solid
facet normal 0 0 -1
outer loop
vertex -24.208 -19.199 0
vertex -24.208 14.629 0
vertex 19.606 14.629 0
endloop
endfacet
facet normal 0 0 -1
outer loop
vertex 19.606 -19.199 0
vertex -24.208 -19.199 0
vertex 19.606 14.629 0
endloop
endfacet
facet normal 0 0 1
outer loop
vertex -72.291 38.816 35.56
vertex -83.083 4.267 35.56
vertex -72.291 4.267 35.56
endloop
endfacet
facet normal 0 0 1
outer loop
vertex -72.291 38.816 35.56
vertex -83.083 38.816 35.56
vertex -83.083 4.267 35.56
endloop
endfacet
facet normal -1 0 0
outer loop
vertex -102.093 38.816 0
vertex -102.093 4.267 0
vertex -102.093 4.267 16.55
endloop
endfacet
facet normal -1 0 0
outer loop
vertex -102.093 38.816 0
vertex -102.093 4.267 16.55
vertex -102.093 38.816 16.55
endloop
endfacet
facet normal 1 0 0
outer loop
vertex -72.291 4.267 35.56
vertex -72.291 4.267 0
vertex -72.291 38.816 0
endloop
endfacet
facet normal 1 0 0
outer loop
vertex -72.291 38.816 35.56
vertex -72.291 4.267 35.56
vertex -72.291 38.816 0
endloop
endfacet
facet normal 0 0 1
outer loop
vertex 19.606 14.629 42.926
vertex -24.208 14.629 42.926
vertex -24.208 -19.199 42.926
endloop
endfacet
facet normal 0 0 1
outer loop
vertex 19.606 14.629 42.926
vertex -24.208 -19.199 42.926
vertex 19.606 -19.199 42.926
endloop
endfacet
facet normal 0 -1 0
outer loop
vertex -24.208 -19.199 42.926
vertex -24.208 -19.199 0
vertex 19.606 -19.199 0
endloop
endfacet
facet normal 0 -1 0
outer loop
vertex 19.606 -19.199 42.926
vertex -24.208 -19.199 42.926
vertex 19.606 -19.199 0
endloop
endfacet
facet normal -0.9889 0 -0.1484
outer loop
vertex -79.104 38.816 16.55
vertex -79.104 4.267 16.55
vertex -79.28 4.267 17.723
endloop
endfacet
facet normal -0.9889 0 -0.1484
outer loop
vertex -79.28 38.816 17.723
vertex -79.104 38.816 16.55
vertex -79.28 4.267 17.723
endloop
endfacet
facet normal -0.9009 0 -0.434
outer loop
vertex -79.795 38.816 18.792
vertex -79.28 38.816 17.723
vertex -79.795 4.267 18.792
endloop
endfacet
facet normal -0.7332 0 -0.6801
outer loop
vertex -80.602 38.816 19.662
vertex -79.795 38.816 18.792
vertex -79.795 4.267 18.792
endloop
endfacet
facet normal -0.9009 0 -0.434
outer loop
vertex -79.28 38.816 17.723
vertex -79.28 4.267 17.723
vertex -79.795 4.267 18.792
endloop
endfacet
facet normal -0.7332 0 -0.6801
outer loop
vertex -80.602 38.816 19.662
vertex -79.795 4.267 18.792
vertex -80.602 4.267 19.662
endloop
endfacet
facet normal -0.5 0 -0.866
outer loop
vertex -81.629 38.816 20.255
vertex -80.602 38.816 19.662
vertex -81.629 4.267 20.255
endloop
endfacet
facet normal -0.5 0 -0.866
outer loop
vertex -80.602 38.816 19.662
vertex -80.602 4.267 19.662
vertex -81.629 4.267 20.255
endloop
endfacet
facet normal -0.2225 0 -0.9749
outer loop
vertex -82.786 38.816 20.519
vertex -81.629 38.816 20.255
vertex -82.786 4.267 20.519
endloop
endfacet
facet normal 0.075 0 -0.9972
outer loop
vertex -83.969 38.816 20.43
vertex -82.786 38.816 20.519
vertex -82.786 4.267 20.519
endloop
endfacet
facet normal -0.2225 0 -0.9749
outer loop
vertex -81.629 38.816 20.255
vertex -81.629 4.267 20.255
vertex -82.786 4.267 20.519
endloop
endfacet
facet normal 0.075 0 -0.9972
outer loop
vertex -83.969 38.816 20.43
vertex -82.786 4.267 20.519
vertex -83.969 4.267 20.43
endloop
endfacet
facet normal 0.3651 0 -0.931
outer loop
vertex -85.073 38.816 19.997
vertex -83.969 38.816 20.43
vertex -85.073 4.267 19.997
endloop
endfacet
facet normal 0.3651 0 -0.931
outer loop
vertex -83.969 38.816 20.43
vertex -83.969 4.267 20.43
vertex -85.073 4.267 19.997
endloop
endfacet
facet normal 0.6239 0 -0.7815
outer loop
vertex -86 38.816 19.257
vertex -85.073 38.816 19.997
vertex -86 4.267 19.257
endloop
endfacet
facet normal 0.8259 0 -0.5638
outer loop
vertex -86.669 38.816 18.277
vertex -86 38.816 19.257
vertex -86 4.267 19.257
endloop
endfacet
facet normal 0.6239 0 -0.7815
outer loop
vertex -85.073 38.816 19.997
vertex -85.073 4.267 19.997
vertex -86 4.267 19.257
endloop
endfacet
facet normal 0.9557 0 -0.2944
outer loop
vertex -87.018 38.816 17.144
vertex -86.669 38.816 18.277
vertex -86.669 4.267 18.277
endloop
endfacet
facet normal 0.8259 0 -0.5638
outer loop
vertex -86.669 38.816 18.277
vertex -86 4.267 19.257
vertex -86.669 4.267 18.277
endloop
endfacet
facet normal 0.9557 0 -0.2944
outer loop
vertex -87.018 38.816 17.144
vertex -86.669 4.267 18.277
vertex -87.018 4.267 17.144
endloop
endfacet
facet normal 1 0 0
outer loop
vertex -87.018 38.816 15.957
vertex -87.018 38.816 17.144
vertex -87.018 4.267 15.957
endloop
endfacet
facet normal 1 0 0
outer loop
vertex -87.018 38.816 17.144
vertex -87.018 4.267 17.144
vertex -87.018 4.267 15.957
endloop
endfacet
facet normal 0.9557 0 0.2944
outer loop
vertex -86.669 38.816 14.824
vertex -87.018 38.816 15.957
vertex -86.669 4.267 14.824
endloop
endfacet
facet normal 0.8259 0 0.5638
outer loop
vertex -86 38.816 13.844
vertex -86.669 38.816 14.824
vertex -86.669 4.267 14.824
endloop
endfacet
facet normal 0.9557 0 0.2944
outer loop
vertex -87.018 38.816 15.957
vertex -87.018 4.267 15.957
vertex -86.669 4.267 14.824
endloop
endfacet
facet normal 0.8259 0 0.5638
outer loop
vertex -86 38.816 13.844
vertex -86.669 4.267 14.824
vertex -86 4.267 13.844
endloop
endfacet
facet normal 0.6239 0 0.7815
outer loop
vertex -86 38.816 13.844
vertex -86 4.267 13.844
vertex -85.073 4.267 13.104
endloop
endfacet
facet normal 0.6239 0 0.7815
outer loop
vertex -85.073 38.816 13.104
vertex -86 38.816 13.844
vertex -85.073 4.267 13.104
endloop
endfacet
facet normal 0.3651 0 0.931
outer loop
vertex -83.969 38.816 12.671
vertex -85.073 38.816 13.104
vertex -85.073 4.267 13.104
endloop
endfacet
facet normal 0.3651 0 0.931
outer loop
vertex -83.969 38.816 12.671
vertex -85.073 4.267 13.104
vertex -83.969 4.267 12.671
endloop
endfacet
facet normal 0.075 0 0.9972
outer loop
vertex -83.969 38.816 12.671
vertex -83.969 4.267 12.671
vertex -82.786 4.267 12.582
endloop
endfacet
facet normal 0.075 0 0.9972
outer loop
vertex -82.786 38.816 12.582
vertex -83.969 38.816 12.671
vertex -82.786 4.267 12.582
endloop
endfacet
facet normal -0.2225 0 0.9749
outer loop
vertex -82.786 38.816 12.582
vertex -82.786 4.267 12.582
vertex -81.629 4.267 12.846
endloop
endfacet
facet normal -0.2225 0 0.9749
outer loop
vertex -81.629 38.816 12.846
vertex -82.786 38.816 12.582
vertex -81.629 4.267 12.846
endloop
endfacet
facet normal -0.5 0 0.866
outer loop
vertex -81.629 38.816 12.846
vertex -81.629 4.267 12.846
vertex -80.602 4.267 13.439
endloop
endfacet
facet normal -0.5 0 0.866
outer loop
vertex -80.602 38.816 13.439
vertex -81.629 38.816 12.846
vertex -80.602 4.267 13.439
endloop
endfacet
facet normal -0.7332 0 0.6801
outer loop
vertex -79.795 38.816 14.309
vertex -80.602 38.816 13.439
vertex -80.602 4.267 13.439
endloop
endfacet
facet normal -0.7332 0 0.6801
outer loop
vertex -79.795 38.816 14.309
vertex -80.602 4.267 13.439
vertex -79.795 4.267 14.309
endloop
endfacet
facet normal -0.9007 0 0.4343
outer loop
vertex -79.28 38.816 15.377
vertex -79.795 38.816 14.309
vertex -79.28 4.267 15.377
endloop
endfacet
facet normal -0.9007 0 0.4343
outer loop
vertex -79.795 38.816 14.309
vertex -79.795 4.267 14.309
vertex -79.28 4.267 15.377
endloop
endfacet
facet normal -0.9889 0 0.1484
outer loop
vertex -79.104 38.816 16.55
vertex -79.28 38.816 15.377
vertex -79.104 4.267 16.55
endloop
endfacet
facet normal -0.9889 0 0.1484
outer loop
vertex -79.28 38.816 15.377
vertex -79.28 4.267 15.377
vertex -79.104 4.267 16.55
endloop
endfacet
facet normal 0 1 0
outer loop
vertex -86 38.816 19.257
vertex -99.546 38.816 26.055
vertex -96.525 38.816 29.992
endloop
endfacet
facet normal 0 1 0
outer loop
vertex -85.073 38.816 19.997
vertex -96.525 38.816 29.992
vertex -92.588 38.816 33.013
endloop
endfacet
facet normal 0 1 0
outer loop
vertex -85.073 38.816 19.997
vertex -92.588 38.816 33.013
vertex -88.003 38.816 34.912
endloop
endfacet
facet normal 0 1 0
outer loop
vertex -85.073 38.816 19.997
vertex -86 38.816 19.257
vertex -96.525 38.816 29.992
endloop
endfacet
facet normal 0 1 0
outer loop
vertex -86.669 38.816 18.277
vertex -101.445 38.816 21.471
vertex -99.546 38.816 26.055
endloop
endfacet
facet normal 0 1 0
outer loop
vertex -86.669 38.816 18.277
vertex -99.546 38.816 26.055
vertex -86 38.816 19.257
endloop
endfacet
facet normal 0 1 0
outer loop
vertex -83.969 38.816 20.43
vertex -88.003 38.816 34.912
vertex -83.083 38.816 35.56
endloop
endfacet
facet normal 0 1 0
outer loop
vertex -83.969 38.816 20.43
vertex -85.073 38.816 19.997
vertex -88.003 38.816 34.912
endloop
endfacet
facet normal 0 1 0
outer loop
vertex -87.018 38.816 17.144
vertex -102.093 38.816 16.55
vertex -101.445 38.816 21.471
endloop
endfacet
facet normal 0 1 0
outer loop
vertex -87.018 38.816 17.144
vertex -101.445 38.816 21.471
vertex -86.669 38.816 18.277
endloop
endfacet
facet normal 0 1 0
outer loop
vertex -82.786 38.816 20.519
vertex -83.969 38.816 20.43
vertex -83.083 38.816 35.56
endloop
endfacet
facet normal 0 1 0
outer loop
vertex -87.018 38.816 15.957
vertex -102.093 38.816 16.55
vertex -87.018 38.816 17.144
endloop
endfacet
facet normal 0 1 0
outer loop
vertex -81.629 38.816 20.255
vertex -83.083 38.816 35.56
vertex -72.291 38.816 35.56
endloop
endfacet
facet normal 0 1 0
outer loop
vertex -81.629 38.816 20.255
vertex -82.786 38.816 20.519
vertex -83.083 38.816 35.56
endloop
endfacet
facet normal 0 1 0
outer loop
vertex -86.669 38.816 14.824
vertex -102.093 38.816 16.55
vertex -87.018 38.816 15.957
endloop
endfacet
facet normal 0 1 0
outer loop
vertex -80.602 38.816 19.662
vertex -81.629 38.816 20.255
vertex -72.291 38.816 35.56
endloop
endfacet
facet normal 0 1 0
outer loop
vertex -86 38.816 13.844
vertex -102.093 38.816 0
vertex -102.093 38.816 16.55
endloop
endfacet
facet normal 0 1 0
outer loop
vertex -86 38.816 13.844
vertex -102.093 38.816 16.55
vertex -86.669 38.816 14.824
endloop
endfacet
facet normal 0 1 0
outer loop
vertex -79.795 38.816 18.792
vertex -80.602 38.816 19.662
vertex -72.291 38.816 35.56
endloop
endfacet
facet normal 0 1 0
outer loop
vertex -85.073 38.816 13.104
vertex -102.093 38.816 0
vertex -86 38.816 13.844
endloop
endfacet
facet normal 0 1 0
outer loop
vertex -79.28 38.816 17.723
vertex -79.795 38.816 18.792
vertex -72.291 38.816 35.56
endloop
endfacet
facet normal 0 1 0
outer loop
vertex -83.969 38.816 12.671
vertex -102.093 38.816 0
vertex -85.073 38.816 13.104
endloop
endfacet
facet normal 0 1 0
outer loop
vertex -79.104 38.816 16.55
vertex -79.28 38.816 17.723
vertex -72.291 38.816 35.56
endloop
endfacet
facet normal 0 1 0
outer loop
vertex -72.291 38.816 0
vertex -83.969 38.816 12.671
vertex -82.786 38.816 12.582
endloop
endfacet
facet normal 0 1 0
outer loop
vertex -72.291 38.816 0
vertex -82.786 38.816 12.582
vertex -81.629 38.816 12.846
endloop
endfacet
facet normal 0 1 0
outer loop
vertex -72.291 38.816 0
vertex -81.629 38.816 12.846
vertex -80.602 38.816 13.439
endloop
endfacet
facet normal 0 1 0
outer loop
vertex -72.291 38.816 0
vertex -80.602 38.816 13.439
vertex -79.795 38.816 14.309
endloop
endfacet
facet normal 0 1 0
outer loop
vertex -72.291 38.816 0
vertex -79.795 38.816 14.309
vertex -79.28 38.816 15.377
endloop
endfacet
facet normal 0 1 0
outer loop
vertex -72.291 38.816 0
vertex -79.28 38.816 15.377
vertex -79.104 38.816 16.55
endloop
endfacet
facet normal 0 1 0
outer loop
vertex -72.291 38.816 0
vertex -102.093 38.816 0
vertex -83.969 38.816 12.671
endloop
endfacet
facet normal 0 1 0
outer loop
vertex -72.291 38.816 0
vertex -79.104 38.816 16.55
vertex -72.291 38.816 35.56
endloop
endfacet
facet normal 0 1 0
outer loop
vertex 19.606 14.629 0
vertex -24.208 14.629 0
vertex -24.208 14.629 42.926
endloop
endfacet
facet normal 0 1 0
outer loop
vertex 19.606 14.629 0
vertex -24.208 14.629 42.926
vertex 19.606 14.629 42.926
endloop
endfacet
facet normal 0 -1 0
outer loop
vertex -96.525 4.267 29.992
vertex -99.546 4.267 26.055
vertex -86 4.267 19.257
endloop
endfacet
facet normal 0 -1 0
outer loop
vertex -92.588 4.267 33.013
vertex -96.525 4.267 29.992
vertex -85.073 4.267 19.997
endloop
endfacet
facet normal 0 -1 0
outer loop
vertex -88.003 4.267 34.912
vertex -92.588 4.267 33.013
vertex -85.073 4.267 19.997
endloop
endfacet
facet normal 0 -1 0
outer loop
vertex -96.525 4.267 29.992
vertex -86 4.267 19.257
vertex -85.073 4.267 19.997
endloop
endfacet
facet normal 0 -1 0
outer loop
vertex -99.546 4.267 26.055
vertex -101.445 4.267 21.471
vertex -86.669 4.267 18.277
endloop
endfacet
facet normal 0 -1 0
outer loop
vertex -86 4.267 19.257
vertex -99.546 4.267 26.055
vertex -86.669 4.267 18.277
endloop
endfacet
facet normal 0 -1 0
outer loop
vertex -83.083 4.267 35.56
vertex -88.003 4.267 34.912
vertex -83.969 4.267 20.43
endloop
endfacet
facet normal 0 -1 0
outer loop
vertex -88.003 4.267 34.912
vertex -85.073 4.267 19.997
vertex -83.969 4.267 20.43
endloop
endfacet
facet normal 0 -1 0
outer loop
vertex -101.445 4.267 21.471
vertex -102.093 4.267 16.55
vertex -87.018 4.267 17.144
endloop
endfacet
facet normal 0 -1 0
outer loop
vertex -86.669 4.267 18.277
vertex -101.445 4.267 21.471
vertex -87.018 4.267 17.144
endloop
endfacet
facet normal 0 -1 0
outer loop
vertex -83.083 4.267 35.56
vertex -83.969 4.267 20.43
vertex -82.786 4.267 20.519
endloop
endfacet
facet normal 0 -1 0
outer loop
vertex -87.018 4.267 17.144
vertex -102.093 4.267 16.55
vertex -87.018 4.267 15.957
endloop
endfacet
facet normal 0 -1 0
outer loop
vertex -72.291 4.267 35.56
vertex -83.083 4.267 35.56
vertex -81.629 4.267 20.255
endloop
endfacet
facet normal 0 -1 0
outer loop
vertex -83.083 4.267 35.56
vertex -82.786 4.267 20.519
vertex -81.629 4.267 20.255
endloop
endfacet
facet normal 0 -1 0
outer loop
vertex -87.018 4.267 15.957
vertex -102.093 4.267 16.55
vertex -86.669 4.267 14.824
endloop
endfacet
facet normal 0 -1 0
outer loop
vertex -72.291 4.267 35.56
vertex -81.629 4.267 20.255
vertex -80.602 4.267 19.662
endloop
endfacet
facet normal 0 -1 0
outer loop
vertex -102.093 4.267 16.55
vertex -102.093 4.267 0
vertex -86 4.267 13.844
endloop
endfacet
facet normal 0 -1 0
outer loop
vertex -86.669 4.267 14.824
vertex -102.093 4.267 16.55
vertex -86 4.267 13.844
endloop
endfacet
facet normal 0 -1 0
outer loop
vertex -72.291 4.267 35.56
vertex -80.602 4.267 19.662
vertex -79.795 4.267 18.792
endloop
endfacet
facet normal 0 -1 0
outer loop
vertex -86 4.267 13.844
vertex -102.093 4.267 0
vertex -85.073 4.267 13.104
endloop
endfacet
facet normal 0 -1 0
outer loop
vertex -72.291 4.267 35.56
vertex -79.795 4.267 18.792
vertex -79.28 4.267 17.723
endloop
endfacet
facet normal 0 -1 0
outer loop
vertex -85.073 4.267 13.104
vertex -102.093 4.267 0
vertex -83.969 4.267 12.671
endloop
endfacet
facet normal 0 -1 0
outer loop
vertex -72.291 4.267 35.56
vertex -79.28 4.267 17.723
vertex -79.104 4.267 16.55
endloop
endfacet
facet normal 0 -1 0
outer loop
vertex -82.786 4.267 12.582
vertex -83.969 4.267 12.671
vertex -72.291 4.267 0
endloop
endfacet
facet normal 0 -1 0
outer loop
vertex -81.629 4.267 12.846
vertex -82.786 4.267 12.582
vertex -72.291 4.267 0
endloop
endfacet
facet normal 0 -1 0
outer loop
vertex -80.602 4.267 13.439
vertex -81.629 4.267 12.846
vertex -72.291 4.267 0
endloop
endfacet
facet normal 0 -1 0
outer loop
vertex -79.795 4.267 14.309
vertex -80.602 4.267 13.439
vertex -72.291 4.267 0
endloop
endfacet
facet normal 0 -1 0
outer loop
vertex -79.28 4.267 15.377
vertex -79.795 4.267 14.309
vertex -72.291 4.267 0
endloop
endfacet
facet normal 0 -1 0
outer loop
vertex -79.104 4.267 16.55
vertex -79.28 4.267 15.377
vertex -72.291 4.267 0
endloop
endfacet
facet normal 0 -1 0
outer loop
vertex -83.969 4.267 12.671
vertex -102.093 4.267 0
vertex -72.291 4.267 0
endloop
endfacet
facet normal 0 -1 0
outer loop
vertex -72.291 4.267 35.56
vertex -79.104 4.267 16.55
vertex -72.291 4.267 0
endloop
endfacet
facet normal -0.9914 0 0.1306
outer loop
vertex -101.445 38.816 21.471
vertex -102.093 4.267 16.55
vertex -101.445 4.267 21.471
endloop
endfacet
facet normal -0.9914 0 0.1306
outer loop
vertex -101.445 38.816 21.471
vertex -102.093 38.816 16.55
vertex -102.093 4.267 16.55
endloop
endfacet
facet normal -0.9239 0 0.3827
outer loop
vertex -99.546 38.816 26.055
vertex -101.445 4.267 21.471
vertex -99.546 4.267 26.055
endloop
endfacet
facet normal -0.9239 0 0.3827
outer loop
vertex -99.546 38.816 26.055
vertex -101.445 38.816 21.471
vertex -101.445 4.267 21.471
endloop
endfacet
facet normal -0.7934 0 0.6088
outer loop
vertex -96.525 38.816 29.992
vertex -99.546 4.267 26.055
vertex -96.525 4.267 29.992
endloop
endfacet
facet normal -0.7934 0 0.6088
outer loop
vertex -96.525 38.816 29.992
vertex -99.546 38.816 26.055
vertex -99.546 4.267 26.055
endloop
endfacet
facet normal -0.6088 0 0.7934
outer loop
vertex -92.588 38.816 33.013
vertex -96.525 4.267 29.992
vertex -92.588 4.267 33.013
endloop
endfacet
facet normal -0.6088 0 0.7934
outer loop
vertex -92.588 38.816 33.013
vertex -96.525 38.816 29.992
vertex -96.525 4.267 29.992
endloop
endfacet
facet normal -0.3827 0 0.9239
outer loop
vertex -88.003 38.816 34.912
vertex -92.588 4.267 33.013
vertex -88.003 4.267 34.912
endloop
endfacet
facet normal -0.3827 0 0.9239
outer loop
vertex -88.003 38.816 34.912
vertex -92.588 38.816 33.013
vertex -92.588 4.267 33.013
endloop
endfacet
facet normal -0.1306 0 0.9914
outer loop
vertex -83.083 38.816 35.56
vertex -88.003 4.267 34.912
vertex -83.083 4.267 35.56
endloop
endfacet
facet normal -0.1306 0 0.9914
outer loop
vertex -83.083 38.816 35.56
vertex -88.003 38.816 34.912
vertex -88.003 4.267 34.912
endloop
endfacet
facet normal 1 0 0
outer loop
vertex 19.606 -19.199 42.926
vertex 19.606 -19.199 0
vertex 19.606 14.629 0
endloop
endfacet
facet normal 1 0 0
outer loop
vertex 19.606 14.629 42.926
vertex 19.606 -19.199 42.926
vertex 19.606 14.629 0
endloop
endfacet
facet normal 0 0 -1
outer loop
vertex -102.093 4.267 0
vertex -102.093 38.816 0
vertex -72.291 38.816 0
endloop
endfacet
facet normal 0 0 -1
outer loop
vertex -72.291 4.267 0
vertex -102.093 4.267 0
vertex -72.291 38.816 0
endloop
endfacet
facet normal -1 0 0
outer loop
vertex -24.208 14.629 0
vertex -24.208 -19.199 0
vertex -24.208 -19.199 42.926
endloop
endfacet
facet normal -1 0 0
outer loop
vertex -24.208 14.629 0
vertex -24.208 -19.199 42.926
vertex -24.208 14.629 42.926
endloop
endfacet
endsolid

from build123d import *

# Parameters (mm, degrees)
F0_W     = 29.801302
F0_H     = 34.548624
F1_DEPTH = 35.56
F2_R     = 19.009518
F3_R     = 3.979546
F4_DEPTH = 34.548624
F5_W     = 43.813979
F5_H     = 33.828304
F6_DEPTH = 42.926


with BuildPart() as f1:
    # F0 (on Top) → F1 (new body)
    with BuildSketch(Plane.XY):
        with Locations((-87.192077, 21.541626)):
            Rectangle(F0_W, F0_H)
    extrude(amount=F1_DEPTH)

    # F2
    f2_edges = [f1.edges().sort_by_distance(p)[0] for p in [
        (-102.092728, 21.541626, 35.56),
    ]]
    fillet(f2_edges, radius=F2_R)

    # F3 (on face) → F4 (cut, through all)
    with BuildSketch(Plane.XZ.offset(-4.267314)):
        with Locations((-83.08321, 16.550482)):
            Circle(F3_R)
    extrude(amount=-F4_DEPTH, mode=Mode.SUBTRACT)


with BuildPart() as f6:
    # F5 (on Top) → F6 (new body)
    with BuildSketch(Plane.XY):
        with Locations((-2.300883, -2.285134)):
            Rectangle(F5_W, F5_H)
    extrude(amount=F6_DEPTH)


solid = Compound([f1.part, f6.part])
